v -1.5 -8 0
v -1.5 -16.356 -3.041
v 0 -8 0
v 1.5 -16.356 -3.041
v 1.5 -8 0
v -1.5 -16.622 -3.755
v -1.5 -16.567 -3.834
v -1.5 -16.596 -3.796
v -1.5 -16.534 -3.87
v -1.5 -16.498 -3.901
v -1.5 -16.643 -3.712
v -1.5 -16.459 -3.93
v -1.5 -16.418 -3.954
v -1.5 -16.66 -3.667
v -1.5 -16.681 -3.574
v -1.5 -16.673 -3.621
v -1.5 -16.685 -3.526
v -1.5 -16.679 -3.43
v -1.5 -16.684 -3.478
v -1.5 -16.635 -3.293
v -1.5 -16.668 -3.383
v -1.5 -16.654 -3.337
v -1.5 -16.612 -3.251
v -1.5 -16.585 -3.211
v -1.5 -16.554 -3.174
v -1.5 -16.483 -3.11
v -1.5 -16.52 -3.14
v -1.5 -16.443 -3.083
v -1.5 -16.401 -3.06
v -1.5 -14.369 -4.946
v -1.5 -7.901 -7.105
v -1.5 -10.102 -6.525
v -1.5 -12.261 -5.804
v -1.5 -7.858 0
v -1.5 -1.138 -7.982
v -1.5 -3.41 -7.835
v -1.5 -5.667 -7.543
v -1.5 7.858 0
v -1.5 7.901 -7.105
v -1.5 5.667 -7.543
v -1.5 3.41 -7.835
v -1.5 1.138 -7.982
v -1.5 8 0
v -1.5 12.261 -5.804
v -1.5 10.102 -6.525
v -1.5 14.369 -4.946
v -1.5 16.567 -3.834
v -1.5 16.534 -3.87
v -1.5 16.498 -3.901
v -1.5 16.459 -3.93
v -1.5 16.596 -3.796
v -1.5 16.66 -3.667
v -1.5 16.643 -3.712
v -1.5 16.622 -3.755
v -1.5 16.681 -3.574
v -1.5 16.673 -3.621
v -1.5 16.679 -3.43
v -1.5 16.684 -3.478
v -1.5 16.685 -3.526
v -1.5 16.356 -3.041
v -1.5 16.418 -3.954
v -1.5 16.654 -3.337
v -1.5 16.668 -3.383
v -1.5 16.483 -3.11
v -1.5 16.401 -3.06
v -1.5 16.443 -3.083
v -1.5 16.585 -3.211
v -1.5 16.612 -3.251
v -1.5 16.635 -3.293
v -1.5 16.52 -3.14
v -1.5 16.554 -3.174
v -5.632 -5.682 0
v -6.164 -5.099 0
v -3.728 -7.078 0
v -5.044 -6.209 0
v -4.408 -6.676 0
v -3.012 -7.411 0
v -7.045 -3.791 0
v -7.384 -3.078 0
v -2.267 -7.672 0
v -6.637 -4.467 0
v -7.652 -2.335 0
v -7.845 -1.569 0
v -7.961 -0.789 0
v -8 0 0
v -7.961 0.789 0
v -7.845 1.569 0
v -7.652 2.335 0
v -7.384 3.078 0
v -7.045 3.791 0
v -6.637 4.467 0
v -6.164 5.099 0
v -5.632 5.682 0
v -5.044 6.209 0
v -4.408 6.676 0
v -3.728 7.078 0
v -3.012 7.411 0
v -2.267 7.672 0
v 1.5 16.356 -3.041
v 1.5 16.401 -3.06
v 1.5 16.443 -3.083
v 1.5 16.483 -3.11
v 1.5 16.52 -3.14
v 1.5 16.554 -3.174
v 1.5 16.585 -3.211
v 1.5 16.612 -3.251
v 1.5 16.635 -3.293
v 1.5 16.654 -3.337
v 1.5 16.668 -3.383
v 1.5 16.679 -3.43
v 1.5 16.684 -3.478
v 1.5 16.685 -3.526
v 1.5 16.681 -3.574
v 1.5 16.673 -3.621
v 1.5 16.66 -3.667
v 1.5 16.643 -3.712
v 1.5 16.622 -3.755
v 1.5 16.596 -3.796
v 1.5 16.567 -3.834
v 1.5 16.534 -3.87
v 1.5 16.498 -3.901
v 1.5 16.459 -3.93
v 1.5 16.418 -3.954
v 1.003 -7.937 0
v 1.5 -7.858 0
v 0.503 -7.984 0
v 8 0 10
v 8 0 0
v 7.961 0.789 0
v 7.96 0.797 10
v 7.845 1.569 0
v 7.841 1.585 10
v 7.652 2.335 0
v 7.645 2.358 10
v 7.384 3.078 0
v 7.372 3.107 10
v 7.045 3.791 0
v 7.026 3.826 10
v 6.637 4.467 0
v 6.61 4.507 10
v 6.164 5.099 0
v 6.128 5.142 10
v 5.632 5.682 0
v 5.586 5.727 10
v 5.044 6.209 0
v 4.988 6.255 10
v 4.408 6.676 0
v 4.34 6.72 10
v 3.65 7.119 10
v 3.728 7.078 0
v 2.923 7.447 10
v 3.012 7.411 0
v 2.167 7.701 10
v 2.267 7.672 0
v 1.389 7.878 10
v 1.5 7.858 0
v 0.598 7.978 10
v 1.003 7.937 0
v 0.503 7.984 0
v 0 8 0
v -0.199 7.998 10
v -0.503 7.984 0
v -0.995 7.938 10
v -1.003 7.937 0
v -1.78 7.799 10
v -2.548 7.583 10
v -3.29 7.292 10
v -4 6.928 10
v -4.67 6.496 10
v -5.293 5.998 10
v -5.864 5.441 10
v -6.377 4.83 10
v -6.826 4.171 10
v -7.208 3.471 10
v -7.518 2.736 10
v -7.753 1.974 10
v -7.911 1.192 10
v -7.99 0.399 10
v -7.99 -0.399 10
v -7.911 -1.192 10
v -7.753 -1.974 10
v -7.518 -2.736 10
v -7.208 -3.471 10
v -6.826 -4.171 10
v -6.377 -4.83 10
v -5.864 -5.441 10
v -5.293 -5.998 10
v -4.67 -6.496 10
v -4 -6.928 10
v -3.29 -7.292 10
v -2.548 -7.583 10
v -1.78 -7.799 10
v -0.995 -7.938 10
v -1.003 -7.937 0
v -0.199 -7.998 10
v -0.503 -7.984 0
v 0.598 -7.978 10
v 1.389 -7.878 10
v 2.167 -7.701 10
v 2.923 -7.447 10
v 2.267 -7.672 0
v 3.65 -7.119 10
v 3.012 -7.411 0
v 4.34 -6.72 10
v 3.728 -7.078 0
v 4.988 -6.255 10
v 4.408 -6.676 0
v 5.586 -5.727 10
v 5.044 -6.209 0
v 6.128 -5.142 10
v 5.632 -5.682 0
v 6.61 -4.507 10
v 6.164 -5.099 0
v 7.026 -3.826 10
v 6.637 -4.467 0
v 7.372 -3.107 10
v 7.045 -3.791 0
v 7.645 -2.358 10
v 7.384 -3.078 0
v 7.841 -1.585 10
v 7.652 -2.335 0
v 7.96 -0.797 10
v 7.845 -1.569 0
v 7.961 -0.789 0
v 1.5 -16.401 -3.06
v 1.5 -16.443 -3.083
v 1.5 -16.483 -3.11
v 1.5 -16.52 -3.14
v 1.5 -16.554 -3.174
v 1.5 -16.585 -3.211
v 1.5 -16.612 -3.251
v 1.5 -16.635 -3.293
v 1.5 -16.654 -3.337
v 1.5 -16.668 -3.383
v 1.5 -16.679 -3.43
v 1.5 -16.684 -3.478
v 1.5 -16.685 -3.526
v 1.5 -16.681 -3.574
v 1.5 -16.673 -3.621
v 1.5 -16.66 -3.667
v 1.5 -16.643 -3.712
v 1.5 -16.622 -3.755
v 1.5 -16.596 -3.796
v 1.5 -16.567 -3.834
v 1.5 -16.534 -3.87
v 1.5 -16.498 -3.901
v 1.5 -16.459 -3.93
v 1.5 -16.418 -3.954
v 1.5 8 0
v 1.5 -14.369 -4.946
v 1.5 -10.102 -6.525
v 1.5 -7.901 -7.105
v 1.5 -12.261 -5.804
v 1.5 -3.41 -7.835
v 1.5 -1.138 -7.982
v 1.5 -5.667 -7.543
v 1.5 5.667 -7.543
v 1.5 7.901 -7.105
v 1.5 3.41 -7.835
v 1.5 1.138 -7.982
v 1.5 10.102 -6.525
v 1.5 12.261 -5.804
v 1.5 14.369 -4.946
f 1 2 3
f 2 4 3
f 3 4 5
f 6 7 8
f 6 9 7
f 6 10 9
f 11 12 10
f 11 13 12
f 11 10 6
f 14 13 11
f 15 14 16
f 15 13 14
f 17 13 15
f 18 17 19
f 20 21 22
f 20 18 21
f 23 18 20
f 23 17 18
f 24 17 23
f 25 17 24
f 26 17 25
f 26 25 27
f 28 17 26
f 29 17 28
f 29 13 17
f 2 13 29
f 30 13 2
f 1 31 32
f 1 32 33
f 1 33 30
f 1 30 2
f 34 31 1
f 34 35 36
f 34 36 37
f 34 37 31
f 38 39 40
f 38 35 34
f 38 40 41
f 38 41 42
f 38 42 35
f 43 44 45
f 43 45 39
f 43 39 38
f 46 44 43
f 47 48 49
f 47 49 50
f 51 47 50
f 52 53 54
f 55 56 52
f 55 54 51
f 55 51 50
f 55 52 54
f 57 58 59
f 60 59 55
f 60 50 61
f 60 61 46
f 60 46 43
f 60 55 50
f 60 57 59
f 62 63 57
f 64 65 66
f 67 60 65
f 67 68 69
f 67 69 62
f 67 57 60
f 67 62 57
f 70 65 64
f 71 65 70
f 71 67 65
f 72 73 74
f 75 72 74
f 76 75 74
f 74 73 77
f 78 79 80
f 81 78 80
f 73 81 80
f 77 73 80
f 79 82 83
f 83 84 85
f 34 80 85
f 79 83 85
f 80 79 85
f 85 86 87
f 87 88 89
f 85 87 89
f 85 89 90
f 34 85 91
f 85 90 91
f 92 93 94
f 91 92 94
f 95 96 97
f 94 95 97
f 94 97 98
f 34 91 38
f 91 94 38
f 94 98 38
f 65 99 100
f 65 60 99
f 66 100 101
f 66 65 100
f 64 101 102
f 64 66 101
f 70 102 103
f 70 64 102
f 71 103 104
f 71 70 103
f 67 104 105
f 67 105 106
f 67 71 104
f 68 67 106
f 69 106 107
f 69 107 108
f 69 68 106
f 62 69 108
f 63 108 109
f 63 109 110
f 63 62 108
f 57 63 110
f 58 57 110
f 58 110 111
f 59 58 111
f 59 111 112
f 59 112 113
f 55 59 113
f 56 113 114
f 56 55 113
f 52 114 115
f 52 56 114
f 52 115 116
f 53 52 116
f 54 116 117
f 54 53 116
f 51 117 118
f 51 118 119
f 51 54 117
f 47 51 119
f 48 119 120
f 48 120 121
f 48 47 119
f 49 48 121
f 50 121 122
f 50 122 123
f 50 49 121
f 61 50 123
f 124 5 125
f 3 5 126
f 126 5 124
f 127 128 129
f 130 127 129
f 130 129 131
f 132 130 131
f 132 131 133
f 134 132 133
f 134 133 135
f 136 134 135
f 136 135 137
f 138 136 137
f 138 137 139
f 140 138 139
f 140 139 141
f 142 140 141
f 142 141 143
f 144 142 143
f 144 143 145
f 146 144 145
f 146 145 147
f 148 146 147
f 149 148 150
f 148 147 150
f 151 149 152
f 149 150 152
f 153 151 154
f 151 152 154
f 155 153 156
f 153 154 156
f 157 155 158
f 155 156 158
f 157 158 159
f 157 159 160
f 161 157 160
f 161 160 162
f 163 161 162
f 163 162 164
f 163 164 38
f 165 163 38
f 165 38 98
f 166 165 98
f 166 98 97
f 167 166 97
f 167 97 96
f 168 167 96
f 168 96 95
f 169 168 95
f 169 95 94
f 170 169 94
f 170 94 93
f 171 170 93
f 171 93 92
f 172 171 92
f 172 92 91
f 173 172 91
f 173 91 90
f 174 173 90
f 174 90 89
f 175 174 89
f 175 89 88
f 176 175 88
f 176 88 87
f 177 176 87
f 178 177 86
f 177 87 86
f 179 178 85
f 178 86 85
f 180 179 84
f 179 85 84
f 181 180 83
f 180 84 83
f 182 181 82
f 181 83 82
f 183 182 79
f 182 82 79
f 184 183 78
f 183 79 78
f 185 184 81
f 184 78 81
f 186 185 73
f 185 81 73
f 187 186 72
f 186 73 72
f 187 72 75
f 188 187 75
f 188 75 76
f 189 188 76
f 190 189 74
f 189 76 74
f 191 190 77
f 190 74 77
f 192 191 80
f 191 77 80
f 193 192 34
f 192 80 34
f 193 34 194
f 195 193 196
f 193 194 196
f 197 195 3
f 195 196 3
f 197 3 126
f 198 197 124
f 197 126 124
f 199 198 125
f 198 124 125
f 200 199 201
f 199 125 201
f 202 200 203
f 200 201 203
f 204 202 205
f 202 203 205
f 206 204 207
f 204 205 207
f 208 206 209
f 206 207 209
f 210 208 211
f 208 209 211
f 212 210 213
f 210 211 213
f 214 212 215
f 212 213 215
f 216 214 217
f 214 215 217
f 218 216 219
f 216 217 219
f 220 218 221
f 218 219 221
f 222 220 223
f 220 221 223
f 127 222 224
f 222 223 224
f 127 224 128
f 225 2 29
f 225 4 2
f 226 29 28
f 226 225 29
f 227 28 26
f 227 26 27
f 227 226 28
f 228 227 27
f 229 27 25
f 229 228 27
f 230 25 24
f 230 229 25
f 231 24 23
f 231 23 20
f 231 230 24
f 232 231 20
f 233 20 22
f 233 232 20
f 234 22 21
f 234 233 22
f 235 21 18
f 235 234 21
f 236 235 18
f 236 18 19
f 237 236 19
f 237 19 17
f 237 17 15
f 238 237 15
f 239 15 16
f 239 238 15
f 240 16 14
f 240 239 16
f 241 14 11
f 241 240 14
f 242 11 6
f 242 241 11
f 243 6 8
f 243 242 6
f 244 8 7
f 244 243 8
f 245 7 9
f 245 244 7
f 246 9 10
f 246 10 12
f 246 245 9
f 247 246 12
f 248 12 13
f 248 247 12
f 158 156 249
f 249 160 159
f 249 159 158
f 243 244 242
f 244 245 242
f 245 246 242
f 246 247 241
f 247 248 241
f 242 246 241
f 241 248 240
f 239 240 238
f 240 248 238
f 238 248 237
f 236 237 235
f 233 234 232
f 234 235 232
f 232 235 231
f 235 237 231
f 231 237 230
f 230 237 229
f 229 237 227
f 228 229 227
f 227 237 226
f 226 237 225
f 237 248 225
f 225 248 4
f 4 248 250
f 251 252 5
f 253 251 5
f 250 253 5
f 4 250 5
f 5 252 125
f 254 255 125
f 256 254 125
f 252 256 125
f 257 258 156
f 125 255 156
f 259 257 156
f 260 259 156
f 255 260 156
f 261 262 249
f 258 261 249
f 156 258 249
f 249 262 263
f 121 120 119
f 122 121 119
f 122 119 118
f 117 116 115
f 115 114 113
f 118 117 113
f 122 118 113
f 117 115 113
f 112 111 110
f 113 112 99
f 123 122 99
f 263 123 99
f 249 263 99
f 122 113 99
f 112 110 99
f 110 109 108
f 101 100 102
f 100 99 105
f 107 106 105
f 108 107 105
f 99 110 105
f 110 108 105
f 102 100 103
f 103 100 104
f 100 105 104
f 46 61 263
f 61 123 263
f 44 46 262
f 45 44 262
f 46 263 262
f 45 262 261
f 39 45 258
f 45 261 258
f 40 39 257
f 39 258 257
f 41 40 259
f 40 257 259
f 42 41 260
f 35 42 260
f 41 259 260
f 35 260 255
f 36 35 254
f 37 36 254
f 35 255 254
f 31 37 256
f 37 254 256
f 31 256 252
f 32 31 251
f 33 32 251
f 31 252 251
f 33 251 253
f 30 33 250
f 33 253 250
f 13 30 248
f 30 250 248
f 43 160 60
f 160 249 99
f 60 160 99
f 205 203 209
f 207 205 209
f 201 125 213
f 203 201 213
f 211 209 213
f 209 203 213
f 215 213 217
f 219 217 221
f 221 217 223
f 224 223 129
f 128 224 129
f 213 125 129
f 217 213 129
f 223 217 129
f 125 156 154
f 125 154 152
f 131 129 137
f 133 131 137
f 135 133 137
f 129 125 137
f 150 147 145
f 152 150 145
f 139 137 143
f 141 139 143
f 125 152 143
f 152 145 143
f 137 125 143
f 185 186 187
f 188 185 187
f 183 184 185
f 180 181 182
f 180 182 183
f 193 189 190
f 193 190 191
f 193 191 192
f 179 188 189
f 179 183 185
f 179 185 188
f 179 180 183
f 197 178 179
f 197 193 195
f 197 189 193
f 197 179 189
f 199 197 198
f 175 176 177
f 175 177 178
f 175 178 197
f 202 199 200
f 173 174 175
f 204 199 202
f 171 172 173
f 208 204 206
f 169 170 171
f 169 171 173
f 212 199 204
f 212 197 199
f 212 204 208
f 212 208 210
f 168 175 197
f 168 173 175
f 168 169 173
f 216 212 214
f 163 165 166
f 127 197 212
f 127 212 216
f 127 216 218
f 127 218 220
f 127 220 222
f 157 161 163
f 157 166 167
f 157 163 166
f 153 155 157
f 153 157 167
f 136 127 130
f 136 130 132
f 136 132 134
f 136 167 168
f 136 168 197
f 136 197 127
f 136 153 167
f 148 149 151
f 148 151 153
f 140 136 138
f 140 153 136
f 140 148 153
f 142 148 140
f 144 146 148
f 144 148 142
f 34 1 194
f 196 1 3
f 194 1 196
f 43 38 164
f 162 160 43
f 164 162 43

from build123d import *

# Parameters (mm, degrees)
SKETCH_1_R           = 8
EXTRUDE_1_DEPTH      = 10
EXTRUDE_2_DEPTH      = 1.5
EXTRUDE_2_DEPTH_BACK = 1.5
FILLET_1_R           = 0.5


with BuildPart() as part:
    # ｽｹｯﾁ1 → ﾎﾞｽ - 押し出し1 (new body)
    with BuildSketch(Plane.XY):
        Circle(SKETCH_1_R)
    extrude(amount=EXTRUDE_1_DEPTH)

    # ｽｹｯﾁ2 → ﾎﾞｽ - 押し出し2 (add, two sides: drawn at the far end of the back side and taken through both)
    with BuildSketch(Plane(origin=(0, 0, 0), x_dir=(0, 0, -1), z_dir=(1, 0, 0)).offset(-EXTRUDE_2_DEPTH_BACK)):
        with BuildLine():
            Line((0, -8), (0, 8))
            Line((0, 8), (3.420201433, 17.396926208))
            ThreePointArc((3.420201433, 17.396926208), (8, 0), (3.420201433, -17.396926208))
            Line((3.420201433, -17.396926208), (0, -8))
        make_face()
    extrude(amount=EXTRUDE_2_DEPTH + EXTRUDE_2_DEPTH_BACK)

    # ﾌｨﾚｯﾄ1
    fillet_1_edges = [part.edges().sort_by_distance(p)[0] for p in [
        (0, -17.396926208, -3.420201433),
        (0, 17.396926208, -3.420201433),
    ]]
    fillet(fillet_1_edges, radius=FILLET_1_R)


solid = part.part
